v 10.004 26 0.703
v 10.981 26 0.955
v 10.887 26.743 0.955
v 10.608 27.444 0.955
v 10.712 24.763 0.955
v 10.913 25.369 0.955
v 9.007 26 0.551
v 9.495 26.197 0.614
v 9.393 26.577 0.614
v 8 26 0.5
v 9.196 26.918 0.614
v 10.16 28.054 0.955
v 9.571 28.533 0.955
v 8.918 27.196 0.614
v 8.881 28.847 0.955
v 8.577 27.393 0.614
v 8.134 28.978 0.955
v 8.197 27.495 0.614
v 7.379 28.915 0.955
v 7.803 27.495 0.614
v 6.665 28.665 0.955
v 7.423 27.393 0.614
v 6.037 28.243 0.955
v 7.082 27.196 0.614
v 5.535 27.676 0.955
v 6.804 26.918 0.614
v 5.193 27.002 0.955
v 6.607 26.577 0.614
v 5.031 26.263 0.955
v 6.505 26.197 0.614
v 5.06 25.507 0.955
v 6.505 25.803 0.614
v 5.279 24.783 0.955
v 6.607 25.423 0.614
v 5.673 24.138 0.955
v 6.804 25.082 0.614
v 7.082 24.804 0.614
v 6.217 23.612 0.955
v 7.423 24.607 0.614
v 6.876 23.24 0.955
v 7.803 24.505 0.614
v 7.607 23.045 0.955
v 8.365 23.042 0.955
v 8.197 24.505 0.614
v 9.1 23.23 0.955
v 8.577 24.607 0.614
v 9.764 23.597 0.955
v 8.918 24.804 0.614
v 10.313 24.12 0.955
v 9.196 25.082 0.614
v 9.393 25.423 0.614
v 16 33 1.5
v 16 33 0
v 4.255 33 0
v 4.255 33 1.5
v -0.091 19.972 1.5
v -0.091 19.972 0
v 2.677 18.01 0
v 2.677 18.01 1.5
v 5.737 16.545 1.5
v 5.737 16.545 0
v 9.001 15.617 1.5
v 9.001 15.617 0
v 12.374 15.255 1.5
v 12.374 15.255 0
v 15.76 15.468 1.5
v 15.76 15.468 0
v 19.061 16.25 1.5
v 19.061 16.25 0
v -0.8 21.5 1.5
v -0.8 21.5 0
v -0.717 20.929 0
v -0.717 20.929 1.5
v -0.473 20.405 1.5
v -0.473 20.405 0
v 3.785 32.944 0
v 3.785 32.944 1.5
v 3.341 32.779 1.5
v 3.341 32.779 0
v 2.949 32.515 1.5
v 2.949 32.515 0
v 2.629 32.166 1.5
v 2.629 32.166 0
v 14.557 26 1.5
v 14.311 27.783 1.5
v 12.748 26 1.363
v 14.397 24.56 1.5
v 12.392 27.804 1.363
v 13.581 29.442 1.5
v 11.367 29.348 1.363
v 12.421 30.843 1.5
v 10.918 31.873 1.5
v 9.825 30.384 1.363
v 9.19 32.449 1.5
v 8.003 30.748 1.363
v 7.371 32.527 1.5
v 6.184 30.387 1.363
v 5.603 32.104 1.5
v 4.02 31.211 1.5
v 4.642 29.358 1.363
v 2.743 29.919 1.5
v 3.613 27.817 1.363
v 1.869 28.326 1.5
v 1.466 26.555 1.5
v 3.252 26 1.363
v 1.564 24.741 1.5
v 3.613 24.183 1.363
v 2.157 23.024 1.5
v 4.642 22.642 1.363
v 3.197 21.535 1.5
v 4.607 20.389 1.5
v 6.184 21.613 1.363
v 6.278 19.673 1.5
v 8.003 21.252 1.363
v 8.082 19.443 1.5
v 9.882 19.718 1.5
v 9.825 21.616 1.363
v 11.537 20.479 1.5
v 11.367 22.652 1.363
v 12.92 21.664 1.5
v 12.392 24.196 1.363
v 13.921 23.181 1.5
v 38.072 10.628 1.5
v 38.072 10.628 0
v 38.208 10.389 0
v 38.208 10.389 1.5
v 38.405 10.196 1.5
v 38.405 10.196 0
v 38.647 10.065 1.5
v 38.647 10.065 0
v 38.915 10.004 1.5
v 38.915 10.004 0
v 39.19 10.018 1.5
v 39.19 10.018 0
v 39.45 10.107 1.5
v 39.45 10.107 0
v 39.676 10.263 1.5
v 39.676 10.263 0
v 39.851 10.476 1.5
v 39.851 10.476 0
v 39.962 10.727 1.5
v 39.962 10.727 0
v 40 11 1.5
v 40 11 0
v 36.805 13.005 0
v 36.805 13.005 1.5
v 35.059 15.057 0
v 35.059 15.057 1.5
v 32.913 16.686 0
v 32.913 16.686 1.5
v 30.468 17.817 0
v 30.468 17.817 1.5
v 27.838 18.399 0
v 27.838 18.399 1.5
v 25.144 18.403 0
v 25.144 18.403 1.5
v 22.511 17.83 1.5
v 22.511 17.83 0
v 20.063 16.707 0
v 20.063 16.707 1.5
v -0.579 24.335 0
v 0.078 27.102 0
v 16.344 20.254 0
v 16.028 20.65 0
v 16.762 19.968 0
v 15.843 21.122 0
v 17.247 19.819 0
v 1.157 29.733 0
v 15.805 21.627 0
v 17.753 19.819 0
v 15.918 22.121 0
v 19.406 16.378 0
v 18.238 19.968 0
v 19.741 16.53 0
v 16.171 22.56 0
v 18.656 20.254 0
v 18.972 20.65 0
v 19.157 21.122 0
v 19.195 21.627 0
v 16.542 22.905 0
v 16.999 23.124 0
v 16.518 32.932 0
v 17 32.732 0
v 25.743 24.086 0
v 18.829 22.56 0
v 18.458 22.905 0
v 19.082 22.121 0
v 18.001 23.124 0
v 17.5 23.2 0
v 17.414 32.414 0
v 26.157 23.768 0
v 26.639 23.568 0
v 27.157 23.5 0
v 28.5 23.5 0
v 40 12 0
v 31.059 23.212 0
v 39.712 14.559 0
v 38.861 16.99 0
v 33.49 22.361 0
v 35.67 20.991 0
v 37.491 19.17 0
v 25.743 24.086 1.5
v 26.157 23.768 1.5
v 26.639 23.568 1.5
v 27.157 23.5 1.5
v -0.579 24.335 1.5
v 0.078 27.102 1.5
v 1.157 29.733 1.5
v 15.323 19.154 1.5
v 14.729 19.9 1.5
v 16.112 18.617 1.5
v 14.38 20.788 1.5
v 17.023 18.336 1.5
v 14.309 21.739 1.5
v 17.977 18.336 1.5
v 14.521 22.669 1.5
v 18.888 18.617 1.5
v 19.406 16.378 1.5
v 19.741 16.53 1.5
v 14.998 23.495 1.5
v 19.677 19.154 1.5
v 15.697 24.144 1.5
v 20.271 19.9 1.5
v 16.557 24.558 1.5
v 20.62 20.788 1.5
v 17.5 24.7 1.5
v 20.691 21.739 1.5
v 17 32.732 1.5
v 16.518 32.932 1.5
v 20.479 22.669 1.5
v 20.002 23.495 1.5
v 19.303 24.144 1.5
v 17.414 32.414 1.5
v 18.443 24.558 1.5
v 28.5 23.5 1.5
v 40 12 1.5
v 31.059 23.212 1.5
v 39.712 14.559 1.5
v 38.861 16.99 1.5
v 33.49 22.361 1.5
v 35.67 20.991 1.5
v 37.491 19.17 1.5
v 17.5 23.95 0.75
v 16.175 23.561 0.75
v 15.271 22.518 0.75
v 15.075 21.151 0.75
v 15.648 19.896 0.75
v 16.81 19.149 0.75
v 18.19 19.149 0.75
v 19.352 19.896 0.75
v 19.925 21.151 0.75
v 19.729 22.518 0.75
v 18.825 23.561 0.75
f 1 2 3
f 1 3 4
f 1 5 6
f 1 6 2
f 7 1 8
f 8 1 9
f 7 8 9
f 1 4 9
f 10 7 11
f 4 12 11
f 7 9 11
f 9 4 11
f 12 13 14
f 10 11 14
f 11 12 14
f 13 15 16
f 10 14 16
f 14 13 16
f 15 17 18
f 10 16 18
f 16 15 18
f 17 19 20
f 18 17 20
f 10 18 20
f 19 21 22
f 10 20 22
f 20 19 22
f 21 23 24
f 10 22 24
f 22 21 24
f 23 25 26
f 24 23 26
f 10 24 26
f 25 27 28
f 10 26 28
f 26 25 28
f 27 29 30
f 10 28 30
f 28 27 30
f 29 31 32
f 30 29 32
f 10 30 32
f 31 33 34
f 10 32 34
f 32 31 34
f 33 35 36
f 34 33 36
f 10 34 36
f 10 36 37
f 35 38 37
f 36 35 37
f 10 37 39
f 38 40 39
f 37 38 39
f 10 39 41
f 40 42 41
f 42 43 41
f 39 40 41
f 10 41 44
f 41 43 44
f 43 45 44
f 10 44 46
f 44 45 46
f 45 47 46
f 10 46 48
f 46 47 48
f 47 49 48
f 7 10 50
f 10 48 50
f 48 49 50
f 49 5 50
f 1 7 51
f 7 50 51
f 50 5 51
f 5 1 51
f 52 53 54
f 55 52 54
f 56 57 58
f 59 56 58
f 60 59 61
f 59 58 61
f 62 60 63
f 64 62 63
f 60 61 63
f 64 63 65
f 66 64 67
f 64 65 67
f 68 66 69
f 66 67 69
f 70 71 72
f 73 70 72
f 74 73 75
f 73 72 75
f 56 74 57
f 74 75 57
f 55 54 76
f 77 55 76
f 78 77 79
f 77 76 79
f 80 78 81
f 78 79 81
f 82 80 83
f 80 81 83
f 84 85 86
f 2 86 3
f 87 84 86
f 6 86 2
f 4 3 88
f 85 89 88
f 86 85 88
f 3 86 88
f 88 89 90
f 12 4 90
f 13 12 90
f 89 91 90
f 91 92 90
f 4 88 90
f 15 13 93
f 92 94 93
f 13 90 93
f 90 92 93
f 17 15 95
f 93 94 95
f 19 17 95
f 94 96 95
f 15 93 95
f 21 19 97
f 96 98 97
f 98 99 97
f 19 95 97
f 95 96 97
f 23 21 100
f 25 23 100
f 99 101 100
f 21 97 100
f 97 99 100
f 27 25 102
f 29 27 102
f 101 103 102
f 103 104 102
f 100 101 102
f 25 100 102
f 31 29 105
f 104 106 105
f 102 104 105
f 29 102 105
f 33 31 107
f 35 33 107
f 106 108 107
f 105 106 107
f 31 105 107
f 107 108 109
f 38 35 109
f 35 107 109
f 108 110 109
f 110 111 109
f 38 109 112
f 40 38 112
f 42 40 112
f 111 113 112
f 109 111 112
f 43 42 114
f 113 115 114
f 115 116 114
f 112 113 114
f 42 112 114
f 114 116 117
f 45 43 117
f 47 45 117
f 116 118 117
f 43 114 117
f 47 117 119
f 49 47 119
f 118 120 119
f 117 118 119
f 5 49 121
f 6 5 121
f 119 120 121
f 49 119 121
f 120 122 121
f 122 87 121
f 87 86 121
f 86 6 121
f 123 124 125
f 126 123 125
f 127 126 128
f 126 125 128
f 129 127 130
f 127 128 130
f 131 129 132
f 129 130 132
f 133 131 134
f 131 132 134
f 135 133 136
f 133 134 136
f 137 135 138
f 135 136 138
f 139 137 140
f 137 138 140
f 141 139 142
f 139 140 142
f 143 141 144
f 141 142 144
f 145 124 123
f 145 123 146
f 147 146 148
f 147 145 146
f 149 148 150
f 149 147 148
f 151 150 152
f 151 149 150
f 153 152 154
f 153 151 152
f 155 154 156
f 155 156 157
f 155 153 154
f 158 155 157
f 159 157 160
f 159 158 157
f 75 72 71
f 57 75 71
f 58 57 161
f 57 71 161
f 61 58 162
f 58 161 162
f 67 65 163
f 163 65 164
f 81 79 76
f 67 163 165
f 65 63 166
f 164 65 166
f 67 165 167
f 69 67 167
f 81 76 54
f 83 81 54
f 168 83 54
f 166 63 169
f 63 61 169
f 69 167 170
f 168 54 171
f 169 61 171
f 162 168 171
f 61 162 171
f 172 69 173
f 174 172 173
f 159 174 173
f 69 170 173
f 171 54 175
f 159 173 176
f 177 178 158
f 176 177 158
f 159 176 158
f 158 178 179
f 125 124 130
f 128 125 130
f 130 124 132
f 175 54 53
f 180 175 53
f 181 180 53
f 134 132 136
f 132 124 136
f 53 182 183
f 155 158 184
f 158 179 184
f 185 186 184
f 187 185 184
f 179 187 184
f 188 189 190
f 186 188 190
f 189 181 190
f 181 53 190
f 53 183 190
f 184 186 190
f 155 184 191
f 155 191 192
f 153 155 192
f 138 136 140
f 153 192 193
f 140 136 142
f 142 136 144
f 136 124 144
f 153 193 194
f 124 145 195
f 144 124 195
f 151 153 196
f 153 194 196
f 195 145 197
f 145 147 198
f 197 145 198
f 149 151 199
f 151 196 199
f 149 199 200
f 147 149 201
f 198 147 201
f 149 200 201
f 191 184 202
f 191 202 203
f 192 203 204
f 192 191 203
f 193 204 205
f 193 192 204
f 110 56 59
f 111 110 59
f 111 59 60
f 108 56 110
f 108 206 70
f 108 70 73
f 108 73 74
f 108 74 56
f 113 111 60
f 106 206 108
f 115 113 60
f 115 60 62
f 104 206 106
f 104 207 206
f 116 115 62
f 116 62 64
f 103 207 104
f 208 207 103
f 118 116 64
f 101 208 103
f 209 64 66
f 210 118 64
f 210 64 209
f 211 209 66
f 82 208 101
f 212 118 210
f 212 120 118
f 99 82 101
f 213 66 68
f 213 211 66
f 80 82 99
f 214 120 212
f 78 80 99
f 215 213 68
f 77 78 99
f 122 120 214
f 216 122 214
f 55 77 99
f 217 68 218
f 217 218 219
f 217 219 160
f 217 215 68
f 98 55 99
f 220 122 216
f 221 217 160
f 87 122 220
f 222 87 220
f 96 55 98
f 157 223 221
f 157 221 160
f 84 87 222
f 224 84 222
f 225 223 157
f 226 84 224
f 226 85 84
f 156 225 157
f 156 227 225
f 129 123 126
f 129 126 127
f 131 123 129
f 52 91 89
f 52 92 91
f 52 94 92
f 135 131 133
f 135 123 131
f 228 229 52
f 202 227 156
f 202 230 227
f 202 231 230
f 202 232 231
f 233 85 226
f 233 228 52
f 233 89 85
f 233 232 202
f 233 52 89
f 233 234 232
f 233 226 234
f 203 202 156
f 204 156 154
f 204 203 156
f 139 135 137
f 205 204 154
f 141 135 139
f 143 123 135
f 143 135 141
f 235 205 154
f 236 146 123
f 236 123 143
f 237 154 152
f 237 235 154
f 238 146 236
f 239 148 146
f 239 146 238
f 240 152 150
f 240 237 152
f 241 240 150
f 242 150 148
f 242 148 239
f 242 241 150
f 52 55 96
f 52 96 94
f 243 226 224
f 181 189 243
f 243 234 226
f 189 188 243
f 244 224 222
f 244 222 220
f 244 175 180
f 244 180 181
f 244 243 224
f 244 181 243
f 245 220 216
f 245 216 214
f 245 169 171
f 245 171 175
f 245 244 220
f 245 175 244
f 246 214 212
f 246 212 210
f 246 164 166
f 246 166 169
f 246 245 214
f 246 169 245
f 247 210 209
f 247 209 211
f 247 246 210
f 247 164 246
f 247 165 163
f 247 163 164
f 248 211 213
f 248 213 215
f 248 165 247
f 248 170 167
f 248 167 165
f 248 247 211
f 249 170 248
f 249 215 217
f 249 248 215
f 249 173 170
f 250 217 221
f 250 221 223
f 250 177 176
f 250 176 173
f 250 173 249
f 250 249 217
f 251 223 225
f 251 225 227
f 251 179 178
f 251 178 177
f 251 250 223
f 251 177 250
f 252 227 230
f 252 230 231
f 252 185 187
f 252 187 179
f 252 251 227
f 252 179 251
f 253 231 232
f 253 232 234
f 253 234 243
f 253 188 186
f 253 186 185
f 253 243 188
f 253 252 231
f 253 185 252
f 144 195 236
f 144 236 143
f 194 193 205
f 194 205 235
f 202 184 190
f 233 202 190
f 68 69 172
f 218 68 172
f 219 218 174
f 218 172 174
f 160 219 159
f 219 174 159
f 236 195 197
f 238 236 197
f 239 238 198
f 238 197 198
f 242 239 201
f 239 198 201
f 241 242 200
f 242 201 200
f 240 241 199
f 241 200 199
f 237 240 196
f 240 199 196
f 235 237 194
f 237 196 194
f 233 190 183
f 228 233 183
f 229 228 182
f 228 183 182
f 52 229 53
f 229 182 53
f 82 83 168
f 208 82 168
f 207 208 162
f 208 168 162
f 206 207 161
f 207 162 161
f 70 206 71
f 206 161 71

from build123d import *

# Parameters (mm, degrees)
PAD003_DEPTH = 1.5
FILLET_R     = 12


with BuildPart() as sphere:
    # Sphere → Sphere (revolve)
    with BuildSketch(Plane(origin=(8, 26, 10.5), x_dir=(1, 0, 0), z_dir=(0, -1, 0))):
        with BuildLine():
            ThreePointArc((0, -10), (10, 0), (0, 10))
            Line((0, 10), (0, -10))
        make_face()
    revolve(axis=Axis((8, 26, 10.5), (0, 0, 1)))


with BuildPart() as clone_of_countersunk002:
    # Sketch007 → Revolution001 (revolve)
    with BuildSketch(Plane.YZ):
        Polygon((3.2, 0), (1.5, -1.7), (1.5, -10), (0, -10), (0, 0), align=None)
    revolve(axis=Axis((0, 0, 0), (0, 0, 1)))


with BuildPart() as clone_of_countersunk002_1:
    # Clone005 placement: moved
    add(clone_of_countersunk002.part.moved(Location((17.5, 21.5, 1.5))))


with BuildPart() as samplefix:
    # Sketch → Pad003 (new body)
    with BuildSketch(Plane.XY):
        with BuildLine():
            ThreePointArc((19.061248, 16.249999), (19.574732, 16.450771), (20.06299, 16.706856))
            ThreePointArc((38.071883, 10.627711), (30.468372, 17.817422), (20.06299, 16.706856))
            ThreePointArc((38.071883, 10.627711), (39.189583, 10.018135), (40, 11))
            Line((40, 12), (40, 11))
            ThreePointArc((40, 12), (36.631728, 20.131728), (28.5, 23.5))
            Line((27.156854, 23.5), (28.5, 23.5))
            ThreePointArc((25.742641, 24.085786), (26.391487, 23.652241), (27.156854, 23.5))
            Line((25.742641, 24.085786), (17.414214, 32.414214))
            ThreePointArc((17.414214, 32.414214), (16.765367, 32.847759), (16, 33))
            Line((16, 33), (4.254623, 33))
            ThreePointArc((4.254623, 33), (3.341193, 32.779226), (2.629424, 32.165644))
            ThreePointArc((2.629424, 32.165644), (0.078439, 27.101717), (-0.8, 21.5))
            ThreePointArc((-0.8, 21.5), (-0.614027, 20.657798), (-0.090695, 19.972222))
            ThreePointArc((-0.090695, 19.972222), (9.000609, 15.617355), (19.061248, 16.249999))
        make_face()
    extrude(amount=PAD003_DEPTH)

    # Cut003: cut Clone of Countersunk002
    add(clone_of_countersunk002_1.part, mode=Mode.SUBTRACT)

    # Cut004: cut Sphere
    add(sphere.part, mode=Mode.SUBTRACT)

    # Fillet
    fillet_edges = [samplefix.edges().sort_by_distance(p)[0] for p in [
        (3.641101, 26, 1.5),
    ]]
    fillet(fillet_edges, radius=FILLET_R)


solid = samplefix.part
